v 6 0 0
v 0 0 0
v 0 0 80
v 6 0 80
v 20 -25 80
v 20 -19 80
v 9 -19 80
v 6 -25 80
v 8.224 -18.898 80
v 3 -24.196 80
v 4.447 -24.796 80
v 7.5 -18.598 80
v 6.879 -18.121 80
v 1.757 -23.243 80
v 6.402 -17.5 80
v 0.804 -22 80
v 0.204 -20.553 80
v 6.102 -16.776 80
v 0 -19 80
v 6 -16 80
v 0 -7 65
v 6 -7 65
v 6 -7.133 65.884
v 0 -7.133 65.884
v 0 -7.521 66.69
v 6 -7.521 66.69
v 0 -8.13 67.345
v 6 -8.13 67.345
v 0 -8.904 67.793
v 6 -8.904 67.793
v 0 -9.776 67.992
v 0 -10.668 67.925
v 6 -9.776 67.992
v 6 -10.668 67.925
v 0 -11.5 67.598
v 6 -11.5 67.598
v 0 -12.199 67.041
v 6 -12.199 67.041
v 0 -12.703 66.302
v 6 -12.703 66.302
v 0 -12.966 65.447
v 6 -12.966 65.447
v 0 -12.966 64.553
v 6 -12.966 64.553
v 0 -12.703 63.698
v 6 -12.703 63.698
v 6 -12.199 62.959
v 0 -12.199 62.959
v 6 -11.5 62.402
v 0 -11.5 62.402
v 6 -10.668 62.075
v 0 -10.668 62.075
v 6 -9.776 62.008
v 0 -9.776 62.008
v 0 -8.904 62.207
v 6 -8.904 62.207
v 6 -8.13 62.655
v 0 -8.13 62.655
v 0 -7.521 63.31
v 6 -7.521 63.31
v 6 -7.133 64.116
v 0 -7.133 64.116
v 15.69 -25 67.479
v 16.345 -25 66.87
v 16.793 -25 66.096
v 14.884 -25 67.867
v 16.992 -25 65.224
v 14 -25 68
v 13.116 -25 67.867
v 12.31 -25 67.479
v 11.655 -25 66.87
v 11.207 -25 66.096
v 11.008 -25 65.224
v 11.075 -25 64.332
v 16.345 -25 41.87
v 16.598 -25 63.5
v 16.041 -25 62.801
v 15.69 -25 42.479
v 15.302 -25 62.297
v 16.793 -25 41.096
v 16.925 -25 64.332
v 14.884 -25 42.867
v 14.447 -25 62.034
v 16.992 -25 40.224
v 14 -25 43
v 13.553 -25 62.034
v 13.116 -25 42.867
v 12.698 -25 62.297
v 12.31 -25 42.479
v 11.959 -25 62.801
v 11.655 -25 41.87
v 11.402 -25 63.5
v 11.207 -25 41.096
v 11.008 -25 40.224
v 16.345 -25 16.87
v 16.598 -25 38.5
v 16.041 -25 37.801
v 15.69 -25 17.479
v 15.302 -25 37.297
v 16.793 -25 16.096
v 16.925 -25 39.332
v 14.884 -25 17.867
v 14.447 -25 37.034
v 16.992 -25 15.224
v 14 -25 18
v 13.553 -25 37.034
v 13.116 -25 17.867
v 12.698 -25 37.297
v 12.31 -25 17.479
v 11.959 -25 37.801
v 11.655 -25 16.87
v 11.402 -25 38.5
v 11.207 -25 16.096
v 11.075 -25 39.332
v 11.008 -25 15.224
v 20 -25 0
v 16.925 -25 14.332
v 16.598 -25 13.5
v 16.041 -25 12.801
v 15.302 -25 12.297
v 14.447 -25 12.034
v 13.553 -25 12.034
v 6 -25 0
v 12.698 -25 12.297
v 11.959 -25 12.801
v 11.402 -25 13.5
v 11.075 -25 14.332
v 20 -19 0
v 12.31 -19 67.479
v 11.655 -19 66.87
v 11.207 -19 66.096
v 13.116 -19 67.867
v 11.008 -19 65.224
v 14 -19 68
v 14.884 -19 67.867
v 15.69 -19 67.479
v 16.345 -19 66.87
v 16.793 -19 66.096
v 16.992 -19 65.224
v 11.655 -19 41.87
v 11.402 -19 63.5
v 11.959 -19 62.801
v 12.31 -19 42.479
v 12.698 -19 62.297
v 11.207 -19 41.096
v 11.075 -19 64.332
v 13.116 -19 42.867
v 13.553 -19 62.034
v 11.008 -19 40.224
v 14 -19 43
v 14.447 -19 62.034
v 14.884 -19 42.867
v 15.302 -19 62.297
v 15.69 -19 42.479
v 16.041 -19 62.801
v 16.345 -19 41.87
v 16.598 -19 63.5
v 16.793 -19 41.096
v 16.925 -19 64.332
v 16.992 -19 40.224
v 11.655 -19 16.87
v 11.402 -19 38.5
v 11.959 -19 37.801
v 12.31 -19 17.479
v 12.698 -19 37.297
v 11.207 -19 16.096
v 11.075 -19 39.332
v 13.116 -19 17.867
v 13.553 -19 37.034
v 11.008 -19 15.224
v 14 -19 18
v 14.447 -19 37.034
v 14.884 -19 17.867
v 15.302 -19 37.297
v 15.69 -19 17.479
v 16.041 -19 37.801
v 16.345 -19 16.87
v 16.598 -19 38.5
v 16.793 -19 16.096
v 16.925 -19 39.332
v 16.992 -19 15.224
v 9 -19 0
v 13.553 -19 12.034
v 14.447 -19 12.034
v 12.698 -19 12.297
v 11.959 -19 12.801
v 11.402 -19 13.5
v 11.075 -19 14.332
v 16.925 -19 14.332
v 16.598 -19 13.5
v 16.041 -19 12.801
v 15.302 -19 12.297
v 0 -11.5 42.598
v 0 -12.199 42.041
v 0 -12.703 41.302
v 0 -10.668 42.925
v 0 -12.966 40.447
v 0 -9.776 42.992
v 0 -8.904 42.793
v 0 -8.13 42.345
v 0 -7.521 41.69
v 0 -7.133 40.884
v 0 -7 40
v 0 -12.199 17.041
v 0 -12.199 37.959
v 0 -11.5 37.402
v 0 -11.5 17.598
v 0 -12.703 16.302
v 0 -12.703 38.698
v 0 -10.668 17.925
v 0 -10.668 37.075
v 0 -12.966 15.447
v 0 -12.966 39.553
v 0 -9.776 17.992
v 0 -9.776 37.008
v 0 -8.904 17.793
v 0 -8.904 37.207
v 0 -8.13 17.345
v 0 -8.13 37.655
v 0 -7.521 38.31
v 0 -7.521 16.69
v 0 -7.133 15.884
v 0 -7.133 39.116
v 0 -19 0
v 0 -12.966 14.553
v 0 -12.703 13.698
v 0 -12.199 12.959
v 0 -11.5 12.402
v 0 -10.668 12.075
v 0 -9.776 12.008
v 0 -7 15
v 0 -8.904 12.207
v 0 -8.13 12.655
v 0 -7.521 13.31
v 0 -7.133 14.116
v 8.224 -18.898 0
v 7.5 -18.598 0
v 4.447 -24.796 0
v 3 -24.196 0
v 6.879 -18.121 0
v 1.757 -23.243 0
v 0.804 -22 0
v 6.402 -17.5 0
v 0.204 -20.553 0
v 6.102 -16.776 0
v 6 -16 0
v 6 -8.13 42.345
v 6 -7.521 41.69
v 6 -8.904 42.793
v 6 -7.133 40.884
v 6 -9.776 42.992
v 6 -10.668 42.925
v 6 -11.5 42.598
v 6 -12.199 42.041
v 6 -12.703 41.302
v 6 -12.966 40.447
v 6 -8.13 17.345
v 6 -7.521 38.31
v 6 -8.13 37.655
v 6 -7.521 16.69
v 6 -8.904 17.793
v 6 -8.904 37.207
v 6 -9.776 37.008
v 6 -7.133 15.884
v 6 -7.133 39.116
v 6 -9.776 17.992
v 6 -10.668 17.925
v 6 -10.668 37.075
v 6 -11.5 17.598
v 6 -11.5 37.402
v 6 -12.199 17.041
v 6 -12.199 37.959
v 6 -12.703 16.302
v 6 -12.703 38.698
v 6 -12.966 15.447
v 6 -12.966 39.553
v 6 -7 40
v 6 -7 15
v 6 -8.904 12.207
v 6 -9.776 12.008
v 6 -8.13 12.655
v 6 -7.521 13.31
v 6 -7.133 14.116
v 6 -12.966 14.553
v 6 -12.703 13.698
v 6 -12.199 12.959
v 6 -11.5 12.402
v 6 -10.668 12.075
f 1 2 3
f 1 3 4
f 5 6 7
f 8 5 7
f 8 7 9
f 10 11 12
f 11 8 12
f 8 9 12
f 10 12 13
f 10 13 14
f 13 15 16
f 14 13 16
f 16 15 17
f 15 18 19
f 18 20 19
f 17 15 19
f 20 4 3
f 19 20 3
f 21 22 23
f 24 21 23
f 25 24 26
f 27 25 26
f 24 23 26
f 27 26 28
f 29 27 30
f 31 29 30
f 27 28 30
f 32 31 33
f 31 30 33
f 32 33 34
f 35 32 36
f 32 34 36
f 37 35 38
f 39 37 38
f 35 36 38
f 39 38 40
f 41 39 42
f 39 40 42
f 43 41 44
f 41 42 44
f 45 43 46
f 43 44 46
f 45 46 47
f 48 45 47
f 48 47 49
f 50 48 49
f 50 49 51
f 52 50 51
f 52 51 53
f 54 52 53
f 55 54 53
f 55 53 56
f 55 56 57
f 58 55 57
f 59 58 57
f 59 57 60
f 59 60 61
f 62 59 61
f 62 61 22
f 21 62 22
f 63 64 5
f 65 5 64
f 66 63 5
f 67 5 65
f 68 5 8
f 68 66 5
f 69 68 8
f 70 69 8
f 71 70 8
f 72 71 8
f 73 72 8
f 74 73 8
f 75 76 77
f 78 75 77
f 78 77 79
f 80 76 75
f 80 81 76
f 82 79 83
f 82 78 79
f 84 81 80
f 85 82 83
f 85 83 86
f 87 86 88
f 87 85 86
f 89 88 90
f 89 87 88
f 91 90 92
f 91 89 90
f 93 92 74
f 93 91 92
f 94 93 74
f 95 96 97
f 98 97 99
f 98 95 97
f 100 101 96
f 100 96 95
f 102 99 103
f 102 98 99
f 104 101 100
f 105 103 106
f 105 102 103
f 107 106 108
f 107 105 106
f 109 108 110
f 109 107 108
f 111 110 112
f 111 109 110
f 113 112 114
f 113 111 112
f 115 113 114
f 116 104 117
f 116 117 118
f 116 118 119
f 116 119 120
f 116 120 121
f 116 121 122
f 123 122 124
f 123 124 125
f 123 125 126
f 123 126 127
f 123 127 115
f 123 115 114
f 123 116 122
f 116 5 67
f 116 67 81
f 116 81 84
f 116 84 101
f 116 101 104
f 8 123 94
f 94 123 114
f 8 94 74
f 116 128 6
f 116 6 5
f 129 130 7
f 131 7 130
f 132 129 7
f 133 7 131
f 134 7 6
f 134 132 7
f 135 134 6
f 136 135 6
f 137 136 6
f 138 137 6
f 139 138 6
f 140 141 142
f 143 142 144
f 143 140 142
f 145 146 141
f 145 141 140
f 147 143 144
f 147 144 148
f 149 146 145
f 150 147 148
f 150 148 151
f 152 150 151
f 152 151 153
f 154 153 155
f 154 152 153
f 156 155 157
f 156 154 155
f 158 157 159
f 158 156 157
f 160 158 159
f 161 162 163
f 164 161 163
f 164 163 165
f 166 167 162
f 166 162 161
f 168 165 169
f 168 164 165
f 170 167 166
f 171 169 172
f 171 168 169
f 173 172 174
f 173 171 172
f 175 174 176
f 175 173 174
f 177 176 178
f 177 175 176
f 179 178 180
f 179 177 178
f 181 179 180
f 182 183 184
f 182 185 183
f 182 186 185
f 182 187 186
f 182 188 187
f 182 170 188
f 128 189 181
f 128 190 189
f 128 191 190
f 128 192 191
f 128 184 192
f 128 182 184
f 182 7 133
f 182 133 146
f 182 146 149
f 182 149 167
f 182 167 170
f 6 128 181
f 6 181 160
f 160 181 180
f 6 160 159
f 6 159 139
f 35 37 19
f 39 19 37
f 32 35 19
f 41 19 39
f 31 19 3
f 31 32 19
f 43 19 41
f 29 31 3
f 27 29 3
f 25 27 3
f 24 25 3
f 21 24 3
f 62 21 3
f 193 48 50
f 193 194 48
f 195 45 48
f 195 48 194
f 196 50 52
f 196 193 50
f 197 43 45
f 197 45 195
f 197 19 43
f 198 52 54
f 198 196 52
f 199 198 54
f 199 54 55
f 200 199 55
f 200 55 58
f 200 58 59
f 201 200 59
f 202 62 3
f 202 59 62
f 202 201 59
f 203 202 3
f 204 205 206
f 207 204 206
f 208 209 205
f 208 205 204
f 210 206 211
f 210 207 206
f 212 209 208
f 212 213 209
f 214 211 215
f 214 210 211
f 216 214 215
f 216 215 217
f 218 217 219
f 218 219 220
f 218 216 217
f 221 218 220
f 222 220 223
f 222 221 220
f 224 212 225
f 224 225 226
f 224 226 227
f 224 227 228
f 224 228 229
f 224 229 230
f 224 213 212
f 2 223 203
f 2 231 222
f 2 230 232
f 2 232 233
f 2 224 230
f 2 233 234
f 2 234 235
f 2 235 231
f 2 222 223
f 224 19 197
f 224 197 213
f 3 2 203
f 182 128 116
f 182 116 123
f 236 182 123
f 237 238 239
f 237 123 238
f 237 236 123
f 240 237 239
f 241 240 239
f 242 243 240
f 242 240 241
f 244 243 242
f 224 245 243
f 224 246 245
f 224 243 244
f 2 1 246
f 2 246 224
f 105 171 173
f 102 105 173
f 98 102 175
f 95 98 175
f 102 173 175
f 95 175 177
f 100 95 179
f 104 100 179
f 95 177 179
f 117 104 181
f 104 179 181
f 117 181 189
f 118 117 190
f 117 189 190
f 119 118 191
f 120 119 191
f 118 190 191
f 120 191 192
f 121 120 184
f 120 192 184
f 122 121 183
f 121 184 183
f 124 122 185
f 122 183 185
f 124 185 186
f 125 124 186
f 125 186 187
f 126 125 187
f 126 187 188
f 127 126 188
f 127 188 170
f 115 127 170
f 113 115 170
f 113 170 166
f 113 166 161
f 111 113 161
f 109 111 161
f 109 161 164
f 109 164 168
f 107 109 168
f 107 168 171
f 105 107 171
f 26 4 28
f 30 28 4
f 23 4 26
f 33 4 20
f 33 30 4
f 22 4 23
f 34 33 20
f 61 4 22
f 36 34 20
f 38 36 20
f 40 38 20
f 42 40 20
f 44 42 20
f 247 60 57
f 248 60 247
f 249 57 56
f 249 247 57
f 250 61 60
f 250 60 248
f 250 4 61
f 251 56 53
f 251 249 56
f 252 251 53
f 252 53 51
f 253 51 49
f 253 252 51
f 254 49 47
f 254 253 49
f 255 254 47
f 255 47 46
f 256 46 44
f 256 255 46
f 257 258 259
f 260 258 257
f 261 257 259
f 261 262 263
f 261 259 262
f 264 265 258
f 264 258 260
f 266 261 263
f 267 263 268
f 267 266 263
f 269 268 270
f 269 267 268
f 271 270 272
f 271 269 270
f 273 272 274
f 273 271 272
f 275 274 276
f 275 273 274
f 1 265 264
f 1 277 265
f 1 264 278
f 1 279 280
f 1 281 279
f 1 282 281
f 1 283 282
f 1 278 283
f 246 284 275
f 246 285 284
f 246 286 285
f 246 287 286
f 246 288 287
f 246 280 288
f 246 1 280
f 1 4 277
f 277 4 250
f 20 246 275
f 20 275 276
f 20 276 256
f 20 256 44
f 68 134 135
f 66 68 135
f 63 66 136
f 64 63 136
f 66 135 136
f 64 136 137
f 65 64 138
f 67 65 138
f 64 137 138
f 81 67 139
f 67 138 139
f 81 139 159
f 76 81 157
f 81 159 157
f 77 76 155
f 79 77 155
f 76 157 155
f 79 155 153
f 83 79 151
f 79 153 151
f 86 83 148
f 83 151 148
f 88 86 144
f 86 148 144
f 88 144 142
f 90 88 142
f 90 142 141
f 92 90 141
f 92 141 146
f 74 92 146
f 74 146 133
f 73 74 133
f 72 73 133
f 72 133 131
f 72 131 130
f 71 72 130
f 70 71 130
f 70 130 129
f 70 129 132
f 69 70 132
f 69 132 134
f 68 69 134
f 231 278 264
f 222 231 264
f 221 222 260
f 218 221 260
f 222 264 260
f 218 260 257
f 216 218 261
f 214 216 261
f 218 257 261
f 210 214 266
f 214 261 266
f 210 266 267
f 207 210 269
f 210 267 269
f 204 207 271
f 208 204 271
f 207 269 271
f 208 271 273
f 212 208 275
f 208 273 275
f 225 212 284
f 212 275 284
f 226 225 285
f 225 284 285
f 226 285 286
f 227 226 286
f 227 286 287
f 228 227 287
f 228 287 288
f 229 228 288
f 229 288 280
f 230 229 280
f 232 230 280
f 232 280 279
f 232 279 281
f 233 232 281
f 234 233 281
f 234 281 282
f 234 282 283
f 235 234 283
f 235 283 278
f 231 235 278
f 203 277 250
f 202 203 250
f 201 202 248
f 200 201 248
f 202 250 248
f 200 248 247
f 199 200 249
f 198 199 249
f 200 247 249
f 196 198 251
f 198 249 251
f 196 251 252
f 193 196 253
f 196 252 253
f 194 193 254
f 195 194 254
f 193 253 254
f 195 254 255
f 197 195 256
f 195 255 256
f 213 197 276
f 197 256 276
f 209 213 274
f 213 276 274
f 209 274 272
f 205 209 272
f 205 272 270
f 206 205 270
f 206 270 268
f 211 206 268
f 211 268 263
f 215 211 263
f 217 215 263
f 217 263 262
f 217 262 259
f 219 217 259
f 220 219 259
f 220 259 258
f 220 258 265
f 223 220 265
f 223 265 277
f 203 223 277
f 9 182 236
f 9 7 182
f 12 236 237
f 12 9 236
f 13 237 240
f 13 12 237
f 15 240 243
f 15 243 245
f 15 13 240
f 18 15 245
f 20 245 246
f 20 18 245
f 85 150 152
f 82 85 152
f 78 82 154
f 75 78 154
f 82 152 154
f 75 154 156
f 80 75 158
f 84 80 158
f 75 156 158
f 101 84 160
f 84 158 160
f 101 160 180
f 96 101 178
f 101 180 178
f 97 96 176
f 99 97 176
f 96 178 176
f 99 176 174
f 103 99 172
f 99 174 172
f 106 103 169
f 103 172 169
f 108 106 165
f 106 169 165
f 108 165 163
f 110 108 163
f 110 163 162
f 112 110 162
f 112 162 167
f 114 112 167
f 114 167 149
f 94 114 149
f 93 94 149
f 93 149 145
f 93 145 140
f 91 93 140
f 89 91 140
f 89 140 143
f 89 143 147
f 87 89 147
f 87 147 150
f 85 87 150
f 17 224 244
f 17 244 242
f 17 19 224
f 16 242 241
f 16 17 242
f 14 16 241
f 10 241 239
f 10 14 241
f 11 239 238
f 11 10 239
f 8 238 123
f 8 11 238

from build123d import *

# Parameters (mm, degrees)
EXTRUDE_1_DEPTH     = 80
SKETCH_2_R          = 3
CUT_EXTRUDE_1_DEPTH = 85.976467331
SKETCH_3_R          = 3
CUT_EXTRUDE_2_DEPTH = 85.622691992
FILLET_1_R          = 6
FILLET_3_R          = 3


with BuildPart() as part:
    # 草图1 → 凸台-拉伸1 (new body)
    with BuildSketch(Plane.XY):
        Polygon((0, 0), (6, 0), (6, -19), (20, -19), (20, -25), (0, -25), align=None)
    extrude(amount=EXTRUDE_1_DEPTH)

    # 草图2 → 切除-拉伸1 (cut, through all)
    with BuildSketch(Plane(origin=(6, 0, 0), x_dir=(0, 0, -1), z_dir=(1, 0, 0))):
        with Locations(Location((-65, -10, 0), (0, 0, 90))):
            Circle(SKETCH_2_R)
        with Locations(Location((-15, -10, 0), (0, 0, 90))):
            Circle(SKETCH_2_R)
        with Locations(Location((-40, -10, 0), (0, 0, 90))):
            Circle(SKETCH_2_R)
    extrude(amount=-CUT_EXTRUDE_1_DEPTH, mode=Mode.SUBTRACT)

    # 草图3 → 切除-拉伸2 (cut, through all)
    with BuildSketch(Plane(origin=(0, -19, 0), x_dir=(1, 0, 0), z_dir=(0, 1, 0))):
        with Locations(Location((14, -15, 0), (0, 0, 270))):
            Circle(SKETCH_3_R)
        with Locations(Location((14, -65, 0), (0, 0, 270))):
            Circle(SKETCH_3_R)
        with Locations(Location((14, -40, 0), (0, 0, 270))):
            Circle(SKETCH_3_R)
    extrude(amount=-CUT_EXTRUDE_2_DEPTH, mode=Mode.SUBTRACT)

    # 圆角1
    fillet_1_edges = [part.edges().sort_by_distance(p)[0] for p in [
        (0, -25, 40),
    ]]
    fillet(fillet_1_edges, radius=FILLET_1_R)

    # 圆角3
    fillet_3_edges = [part.edges().sort_by_distance(p)[0] for p in [
        (6, -19, 40),
    ]]
    fillet(fillet_3_edges, radius=FILLET_3_R)


solid = part.part
